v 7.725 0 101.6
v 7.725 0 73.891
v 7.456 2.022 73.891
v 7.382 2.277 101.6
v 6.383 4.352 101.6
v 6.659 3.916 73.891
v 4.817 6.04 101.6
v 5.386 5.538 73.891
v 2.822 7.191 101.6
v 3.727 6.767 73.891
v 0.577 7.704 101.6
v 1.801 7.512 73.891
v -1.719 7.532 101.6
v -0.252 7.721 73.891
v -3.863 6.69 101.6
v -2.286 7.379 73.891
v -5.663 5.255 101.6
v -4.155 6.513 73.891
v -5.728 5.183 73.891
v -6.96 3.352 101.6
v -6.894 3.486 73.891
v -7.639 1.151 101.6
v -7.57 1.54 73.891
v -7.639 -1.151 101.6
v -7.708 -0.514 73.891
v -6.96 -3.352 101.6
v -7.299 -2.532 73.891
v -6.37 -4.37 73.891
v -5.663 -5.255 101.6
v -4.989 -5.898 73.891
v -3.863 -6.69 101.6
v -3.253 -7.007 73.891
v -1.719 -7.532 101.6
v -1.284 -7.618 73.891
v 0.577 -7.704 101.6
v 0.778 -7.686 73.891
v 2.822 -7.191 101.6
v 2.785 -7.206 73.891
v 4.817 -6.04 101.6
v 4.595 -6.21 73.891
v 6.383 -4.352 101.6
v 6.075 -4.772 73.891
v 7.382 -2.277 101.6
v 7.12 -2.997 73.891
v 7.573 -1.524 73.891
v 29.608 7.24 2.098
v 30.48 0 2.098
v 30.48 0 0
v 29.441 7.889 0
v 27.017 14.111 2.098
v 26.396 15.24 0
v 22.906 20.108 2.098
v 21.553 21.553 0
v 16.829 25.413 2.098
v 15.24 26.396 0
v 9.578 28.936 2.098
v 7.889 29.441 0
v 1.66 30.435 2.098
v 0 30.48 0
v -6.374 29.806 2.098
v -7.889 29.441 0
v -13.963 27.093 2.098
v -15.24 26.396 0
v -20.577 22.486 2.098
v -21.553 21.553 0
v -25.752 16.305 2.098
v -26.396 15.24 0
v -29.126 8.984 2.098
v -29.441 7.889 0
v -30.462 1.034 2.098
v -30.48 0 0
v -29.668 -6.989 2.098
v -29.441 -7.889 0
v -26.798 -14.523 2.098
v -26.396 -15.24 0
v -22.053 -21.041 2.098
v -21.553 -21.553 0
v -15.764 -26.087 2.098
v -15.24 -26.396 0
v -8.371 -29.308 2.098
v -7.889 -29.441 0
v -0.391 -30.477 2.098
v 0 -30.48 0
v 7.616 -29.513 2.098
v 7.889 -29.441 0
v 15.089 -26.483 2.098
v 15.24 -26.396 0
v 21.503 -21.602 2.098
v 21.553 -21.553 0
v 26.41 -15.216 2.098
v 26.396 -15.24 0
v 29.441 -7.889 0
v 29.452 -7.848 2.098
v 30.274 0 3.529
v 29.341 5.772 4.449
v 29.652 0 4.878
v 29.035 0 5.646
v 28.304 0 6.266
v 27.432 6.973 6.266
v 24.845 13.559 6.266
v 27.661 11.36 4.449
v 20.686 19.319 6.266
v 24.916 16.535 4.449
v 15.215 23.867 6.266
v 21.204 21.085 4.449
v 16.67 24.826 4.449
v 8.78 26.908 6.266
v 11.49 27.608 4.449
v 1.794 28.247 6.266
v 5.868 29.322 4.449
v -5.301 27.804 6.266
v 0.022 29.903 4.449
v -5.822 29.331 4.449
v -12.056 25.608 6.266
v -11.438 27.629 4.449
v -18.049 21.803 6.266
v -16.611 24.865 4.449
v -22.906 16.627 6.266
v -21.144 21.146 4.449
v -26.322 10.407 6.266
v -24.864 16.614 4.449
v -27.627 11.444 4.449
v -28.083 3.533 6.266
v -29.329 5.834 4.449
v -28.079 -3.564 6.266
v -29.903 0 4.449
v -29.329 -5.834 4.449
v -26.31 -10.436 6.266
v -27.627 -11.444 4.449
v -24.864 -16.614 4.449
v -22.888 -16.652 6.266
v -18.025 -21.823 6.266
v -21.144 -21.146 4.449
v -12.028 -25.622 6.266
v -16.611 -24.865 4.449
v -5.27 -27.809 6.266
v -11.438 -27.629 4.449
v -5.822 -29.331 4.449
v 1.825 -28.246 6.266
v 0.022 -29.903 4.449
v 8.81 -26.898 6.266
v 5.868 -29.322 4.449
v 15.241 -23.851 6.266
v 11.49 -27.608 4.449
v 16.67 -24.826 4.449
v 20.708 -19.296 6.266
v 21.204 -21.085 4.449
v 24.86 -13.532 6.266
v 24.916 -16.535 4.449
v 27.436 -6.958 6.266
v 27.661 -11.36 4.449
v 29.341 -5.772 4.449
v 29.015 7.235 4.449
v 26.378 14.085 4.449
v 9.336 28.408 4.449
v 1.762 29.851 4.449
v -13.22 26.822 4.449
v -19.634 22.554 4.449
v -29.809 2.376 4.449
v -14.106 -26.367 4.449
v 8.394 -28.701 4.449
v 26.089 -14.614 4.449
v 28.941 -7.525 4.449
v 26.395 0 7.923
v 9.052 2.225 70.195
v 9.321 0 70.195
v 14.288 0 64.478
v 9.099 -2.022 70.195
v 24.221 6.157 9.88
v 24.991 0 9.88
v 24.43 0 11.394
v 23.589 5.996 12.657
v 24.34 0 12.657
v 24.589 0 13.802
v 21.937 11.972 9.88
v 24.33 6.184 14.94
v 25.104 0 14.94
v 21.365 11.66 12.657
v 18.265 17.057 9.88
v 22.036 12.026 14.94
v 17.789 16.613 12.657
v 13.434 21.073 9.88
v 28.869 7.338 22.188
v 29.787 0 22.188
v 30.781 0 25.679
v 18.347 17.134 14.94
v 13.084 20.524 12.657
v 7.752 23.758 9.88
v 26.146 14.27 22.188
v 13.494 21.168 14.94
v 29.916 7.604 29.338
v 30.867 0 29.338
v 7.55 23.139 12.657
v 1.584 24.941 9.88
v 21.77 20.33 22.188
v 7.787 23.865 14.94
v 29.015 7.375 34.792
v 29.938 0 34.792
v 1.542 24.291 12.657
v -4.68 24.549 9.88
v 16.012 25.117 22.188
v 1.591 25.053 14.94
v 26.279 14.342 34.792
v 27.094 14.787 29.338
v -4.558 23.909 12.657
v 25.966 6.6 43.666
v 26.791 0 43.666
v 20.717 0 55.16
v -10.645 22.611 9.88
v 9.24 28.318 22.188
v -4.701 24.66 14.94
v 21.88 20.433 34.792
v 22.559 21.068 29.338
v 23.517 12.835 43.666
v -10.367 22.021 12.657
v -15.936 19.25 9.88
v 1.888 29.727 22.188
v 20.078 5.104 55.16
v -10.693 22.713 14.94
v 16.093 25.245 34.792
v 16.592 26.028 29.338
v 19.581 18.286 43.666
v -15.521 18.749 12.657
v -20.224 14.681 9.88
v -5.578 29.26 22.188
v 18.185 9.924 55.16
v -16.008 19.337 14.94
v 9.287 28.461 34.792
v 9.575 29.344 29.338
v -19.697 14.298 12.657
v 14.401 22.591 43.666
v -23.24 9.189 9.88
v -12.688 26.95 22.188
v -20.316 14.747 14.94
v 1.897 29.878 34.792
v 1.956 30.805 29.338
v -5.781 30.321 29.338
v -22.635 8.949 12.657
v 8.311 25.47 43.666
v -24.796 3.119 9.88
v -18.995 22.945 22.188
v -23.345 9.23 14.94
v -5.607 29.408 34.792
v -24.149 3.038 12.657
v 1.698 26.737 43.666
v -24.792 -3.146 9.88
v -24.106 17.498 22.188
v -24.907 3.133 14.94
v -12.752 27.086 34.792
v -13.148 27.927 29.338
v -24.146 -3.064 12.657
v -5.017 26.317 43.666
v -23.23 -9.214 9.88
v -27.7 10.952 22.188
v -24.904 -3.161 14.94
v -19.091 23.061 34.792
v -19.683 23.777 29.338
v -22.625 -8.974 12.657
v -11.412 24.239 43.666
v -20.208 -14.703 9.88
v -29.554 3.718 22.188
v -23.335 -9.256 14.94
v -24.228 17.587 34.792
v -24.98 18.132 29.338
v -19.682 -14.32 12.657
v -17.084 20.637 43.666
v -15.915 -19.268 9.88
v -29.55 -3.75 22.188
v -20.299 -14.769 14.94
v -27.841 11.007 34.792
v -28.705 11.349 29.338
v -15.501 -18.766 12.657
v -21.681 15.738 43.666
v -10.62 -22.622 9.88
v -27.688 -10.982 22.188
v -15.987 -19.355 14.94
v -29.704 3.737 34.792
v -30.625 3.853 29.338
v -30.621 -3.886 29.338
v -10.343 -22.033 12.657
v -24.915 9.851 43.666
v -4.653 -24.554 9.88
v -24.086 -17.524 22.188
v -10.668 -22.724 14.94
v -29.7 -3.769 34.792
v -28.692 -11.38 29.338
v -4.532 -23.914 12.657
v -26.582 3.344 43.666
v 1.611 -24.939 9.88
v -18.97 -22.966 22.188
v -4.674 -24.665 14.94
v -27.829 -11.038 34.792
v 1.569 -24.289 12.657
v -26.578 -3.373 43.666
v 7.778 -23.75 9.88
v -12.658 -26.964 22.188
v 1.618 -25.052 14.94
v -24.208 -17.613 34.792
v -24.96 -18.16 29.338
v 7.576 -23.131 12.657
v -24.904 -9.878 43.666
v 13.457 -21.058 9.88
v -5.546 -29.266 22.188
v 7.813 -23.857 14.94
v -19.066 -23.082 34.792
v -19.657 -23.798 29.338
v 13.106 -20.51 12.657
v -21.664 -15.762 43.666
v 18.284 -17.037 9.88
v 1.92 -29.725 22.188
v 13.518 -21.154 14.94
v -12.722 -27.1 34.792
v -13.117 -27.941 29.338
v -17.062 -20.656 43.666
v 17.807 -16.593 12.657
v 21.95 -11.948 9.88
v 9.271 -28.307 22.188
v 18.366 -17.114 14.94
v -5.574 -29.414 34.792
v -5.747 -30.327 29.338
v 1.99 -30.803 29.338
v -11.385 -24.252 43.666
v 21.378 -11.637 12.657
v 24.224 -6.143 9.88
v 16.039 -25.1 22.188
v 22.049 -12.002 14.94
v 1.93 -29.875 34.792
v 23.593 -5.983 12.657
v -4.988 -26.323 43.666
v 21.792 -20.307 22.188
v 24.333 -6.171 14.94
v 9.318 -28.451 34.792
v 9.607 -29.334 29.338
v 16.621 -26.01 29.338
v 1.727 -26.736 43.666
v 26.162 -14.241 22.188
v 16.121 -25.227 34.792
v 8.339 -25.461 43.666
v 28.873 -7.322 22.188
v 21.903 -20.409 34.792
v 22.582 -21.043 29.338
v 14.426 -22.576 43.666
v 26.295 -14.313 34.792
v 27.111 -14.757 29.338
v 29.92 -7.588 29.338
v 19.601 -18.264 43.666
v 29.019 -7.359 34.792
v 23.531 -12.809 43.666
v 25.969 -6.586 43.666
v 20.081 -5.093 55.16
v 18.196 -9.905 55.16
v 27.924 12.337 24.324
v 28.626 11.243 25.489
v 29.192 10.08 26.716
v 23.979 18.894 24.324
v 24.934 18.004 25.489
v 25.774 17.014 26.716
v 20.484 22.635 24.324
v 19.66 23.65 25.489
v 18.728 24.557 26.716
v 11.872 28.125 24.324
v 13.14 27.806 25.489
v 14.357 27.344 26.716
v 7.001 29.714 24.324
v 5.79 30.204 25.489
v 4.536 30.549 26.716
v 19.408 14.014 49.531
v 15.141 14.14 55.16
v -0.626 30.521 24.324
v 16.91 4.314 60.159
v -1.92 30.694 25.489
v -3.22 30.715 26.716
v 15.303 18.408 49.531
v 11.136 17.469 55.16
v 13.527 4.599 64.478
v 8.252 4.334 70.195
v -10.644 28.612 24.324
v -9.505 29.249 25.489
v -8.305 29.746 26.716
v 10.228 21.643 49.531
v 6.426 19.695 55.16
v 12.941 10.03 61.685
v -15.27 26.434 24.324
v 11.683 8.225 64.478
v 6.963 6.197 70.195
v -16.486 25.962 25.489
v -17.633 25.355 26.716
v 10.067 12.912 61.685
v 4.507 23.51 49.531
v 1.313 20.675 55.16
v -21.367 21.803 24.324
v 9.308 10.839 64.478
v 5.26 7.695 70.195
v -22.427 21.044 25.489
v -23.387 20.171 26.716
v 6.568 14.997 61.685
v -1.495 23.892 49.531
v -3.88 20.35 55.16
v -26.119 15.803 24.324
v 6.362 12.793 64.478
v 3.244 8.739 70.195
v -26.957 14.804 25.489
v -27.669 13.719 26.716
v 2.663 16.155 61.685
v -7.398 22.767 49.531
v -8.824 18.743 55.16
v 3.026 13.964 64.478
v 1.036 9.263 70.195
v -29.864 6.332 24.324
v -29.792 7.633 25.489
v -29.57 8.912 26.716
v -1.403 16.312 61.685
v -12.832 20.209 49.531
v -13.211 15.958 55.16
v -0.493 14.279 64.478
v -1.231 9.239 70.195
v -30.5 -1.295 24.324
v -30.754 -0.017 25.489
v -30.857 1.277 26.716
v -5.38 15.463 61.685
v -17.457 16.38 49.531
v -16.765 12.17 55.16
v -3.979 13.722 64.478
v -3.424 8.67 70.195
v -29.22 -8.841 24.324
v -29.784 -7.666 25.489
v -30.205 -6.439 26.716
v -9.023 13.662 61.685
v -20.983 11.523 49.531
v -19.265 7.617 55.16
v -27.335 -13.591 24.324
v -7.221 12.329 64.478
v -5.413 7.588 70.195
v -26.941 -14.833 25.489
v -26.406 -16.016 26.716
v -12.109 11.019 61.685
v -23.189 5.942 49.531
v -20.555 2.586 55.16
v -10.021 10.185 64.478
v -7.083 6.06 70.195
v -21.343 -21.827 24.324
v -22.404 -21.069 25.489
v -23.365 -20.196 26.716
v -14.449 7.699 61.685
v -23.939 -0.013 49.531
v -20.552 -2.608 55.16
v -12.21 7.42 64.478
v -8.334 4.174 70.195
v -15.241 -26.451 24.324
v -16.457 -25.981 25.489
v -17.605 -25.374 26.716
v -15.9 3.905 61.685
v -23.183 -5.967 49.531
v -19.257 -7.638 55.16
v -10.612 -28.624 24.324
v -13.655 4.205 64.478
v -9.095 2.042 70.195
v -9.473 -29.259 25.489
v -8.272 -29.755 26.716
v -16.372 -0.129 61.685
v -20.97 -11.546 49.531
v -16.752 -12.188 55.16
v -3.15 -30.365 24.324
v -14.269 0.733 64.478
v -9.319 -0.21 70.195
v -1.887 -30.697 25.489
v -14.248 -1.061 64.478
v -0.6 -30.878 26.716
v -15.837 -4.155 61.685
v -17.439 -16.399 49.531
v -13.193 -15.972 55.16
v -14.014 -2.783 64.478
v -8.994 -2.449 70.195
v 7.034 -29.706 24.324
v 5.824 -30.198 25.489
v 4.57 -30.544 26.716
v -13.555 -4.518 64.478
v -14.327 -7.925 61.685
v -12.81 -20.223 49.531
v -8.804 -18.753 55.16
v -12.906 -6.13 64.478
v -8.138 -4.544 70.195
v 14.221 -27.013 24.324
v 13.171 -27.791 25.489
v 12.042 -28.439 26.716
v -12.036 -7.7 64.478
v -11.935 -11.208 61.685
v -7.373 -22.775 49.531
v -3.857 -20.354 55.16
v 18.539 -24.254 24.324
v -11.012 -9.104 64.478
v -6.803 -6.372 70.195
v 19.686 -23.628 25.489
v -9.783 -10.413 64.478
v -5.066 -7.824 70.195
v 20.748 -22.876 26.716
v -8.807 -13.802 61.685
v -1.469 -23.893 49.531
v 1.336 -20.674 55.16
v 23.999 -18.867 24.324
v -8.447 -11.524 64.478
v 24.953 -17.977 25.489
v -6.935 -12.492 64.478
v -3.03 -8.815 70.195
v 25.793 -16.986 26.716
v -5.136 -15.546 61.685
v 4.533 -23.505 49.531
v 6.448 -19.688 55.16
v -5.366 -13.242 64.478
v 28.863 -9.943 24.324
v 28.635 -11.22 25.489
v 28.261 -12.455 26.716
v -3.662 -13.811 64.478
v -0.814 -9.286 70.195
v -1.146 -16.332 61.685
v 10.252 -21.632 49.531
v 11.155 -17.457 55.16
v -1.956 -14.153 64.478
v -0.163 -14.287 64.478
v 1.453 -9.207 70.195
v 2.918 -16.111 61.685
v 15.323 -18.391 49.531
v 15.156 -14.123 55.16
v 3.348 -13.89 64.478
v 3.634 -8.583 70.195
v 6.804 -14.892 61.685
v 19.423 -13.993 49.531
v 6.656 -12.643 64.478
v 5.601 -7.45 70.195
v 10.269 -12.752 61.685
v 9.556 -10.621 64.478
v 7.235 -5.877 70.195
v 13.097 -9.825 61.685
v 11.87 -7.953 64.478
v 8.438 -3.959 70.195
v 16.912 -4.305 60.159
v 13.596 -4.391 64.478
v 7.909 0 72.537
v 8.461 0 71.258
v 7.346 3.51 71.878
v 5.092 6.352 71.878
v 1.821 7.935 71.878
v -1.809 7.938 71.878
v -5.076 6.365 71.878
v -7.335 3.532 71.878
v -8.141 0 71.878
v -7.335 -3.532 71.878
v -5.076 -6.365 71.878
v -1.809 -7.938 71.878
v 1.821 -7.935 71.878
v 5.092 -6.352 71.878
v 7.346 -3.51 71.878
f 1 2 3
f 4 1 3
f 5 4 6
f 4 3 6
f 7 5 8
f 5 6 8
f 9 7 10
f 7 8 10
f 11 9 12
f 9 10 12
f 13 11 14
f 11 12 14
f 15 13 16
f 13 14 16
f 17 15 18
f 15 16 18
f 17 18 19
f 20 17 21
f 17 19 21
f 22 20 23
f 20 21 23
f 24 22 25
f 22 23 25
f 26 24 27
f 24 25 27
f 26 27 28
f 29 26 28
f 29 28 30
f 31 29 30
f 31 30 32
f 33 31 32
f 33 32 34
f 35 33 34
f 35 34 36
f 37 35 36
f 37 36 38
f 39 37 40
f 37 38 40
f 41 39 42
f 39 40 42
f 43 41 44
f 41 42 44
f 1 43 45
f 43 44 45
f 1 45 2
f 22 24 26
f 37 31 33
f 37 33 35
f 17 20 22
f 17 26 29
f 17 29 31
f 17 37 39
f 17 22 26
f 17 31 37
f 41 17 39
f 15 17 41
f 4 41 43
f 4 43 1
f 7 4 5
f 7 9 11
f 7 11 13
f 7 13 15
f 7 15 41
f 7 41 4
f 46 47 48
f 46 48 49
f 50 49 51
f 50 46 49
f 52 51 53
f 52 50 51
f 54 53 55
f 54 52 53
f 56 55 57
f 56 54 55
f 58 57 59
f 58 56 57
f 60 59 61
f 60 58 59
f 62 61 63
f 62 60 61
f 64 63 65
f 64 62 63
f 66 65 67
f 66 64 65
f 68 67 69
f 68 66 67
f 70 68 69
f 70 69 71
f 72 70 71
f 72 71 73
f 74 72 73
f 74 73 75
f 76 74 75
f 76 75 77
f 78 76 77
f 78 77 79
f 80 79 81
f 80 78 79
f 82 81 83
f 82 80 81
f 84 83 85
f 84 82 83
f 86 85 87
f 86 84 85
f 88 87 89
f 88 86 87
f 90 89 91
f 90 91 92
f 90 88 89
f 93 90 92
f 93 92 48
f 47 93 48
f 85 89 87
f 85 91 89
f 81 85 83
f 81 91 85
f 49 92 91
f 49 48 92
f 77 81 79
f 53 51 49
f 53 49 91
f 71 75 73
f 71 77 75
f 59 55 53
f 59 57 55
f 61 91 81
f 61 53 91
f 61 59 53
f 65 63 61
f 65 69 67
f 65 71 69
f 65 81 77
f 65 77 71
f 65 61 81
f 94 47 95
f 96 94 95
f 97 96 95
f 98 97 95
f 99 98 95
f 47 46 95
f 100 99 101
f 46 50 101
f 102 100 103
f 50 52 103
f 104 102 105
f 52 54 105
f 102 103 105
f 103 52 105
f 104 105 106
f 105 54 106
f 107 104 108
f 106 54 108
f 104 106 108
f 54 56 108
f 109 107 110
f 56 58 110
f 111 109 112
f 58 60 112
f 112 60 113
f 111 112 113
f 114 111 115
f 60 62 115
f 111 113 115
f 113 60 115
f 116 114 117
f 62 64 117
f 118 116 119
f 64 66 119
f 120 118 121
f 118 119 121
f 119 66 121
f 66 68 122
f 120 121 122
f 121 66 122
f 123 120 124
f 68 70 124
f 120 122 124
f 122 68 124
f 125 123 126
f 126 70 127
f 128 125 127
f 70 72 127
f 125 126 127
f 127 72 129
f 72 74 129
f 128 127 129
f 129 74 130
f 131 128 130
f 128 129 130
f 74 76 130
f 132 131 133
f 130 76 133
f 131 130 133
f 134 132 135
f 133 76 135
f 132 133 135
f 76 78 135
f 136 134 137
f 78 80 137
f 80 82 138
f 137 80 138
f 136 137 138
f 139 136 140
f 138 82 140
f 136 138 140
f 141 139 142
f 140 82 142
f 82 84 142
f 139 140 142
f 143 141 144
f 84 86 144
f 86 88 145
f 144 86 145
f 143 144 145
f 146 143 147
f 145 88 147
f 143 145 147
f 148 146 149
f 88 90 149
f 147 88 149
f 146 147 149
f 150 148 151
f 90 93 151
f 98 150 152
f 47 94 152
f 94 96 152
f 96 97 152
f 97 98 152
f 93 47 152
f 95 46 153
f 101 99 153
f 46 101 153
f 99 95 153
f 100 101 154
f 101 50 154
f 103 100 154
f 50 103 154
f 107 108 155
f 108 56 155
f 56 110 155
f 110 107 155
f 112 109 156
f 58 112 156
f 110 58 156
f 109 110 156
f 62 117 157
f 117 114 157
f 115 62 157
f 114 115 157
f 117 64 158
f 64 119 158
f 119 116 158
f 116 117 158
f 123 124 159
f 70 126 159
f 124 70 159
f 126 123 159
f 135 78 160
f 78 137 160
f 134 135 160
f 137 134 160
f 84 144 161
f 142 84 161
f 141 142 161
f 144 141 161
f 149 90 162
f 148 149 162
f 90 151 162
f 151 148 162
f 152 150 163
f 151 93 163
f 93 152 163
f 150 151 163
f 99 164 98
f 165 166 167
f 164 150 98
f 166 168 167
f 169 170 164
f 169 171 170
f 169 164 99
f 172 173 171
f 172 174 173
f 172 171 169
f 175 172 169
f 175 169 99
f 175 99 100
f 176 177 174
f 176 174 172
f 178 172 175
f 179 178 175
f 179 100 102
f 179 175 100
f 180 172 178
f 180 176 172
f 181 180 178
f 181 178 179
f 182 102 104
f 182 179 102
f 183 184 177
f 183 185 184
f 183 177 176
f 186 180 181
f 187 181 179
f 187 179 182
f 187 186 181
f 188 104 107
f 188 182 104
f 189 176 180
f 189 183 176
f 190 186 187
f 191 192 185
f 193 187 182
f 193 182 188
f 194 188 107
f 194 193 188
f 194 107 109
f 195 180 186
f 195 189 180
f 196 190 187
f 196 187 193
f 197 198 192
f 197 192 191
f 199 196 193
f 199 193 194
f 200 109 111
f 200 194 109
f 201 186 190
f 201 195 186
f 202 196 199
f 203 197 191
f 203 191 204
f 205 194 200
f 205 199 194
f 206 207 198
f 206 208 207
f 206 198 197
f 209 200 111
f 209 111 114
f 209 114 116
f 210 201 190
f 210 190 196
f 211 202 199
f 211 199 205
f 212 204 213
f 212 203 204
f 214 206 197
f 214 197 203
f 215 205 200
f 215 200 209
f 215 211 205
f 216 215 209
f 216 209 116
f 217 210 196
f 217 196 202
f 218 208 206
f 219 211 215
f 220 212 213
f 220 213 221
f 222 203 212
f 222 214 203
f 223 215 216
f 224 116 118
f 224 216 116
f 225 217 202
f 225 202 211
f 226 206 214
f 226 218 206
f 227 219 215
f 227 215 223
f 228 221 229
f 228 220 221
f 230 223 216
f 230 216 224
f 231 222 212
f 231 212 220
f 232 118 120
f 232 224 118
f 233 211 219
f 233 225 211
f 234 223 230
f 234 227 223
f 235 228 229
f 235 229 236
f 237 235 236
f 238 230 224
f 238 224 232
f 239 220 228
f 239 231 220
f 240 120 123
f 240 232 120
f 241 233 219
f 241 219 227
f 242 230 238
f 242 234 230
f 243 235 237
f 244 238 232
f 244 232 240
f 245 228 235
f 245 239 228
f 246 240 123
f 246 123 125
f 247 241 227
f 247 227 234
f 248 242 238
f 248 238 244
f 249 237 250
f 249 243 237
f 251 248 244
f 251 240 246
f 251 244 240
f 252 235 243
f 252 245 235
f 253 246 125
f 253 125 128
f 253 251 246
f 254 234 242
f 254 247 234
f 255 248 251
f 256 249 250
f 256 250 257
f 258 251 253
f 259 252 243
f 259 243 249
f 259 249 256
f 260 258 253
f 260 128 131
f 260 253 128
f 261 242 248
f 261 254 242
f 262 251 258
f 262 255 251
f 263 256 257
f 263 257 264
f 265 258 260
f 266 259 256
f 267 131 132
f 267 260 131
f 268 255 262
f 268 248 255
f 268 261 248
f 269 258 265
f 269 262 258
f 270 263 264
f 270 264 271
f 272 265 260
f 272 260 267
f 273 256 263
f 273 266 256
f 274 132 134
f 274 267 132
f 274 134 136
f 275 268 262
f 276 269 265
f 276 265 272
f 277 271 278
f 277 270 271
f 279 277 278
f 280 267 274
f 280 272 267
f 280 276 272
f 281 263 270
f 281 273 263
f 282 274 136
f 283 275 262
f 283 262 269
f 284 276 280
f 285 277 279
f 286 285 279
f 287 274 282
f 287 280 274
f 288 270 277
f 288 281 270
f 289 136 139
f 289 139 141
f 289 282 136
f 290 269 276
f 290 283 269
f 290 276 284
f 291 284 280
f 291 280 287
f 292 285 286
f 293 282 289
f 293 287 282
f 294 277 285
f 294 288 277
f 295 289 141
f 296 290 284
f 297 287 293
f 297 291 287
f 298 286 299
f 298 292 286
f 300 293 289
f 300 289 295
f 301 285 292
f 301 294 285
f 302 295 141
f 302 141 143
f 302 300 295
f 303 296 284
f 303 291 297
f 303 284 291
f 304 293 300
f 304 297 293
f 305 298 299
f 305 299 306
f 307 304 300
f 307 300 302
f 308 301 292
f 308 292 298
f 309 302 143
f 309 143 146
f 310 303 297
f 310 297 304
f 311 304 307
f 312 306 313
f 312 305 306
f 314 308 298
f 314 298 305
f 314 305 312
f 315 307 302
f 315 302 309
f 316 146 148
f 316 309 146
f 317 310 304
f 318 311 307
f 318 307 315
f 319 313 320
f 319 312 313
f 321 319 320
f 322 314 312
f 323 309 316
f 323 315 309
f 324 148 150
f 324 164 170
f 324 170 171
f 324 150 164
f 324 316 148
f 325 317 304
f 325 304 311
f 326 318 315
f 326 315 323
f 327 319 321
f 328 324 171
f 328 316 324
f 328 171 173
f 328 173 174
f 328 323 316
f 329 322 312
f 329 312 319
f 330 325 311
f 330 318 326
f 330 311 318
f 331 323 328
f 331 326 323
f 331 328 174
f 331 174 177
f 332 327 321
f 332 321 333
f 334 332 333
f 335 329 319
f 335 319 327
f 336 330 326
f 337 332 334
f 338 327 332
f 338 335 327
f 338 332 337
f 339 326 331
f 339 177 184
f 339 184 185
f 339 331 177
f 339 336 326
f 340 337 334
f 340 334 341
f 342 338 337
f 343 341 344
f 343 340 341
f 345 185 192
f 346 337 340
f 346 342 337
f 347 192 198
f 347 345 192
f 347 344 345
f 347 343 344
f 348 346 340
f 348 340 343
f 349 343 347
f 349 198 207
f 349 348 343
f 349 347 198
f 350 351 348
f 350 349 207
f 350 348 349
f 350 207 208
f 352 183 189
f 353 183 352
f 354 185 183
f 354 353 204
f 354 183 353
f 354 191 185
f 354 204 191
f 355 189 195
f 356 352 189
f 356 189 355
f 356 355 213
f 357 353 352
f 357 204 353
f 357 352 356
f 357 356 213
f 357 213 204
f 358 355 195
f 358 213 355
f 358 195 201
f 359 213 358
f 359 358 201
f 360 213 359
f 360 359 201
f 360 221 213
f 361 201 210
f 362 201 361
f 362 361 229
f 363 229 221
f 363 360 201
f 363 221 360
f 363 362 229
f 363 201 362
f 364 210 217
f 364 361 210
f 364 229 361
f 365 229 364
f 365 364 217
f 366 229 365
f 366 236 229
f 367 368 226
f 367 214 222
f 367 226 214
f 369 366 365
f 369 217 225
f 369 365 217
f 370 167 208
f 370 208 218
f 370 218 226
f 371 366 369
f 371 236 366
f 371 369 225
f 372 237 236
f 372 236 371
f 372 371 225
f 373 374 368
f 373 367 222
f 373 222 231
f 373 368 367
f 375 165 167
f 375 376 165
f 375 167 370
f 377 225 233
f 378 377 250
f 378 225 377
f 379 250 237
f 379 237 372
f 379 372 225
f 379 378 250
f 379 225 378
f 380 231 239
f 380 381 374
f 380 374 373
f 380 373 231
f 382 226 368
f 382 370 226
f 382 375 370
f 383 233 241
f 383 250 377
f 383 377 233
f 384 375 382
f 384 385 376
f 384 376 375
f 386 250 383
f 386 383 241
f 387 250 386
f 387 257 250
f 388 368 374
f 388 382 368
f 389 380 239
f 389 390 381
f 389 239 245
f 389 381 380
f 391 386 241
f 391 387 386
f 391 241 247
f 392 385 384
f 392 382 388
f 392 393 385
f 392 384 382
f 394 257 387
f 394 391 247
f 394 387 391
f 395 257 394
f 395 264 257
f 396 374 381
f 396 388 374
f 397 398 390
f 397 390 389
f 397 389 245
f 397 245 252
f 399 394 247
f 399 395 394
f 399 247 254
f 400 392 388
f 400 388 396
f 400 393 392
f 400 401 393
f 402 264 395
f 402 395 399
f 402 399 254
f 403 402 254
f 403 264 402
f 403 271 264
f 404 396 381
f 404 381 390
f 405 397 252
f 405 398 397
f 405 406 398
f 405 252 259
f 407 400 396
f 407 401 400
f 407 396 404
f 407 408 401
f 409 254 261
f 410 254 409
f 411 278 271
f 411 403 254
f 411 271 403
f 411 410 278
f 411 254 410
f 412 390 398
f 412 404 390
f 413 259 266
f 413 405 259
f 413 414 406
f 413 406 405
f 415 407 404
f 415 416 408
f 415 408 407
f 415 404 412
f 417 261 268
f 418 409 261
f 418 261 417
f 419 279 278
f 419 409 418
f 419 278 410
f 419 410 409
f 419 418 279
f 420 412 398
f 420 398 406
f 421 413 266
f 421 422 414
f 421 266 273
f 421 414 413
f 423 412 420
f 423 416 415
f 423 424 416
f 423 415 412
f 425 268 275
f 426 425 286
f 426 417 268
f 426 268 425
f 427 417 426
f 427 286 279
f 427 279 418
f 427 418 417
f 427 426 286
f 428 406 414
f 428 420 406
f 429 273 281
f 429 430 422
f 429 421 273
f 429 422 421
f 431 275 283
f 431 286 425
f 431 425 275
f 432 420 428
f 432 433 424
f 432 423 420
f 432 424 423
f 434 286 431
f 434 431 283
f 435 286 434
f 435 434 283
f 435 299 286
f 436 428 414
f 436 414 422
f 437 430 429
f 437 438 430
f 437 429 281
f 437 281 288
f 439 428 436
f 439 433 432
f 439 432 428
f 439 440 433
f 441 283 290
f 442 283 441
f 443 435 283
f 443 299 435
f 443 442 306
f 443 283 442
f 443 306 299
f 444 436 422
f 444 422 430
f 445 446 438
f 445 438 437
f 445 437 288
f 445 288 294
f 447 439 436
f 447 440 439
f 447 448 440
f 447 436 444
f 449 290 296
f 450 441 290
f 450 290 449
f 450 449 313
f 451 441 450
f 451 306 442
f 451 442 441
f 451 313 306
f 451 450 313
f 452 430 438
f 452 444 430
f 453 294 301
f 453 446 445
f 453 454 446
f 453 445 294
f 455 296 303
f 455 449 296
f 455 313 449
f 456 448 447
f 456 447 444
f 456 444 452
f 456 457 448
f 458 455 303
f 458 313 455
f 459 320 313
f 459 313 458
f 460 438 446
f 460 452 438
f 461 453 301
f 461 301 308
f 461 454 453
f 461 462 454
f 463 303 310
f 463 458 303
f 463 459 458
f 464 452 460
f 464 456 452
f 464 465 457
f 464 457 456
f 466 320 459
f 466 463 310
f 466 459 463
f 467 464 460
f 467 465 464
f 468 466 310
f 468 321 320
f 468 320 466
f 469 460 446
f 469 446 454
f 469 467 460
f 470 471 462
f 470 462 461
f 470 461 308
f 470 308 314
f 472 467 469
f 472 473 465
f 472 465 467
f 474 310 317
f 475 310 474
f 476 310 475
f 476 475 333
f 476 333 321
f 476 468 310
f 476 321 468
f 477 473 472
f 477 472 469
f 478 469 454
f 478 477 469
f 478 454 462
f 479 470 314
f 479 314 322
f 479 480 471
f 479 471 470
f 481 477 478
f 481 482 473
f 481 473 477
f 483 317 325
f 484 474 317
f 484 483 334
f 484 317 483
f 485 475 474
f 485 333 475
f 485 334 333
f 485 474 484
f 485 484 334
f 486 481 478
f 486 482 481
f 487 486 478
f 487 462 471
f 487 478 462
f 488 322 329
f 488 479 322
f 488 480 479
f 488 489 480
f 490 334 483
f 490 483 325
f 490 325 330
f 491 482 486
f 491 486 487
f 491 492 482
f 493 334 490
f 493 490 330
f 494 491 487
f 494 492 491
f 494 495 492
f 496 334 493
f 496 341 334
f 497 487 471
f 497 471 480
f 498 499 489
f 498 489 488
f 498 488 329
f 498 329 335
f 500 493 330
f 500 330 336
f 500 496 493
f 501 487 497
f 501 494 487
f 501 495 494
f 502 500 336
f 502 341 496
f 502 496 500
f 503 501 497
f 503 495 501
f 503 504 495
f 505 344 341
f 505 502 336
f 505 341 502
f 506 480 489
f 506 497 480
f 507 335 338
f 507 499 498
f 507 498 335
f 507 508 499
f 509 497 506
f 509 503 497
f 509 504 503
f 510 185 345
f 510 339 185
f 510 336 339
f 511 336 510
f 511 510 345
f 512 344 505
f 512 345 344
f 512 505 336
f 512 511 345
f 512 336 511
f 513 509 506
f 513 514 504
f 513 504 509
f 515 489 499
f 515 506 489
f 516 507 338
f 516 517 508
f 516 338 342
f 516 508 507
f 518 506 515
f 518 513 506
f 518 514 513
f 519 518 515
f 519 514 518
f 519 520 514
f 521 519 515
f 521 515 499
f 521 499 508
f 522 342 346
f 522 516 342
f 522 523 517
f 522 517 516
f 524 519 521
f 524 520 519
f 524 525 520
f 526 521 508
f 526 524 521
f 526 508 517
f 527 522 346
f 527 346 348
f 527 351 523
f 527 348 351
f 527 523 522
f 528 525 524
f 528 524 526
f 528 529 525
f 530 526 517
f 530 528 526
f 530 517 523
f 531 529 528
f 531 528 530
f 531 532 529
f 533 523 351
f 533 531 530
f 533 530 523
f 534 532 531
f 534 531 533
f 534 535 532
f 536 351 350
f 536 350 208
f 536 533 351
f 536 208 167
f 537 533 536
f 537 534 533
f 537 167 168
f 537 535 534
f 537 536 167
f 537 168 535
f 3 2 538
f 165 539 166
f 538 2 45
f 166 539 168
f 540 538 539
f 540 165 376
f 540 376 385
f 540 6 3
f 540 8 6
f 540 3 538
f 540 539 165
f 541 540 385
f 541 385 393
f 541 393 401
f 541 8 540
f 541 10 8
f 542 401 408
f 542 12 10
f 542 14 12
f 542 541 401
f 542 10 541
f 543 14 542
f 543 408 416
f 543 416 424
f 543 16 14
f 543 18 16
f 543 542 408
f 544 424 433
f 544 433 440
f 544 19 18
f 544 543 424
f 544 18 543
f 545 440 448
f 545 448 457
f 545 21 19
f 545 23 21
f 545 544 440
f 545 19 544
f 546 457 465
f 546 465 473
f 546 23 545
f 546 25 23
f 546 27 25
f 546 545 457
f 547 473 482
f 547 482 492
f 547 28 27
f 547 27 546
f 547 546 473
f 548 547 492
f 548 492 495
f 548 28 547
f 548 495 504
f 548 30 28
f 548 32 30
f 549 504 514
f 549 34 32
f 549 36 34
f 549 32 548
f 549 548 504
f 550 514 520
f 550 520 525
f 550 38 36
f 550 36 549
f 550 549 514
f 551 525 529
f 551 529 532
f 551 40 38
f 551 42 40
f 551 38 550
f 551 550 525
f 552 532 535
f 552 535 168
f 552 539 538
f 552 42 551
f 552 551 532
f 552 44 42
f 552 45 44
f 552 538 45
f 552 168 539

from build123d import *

# Parameters (mm, degrees)
F2_R     = 5.08
F3_DEPTH = 30.48
F4_R     = 5.08


with BuildPart() as f1:
    # F0 (on Front) → F1 (revolve)
    with BuildSketch(Plane.XZ):
        with BuildLine():
            add(Edge.make_bspline(
                [(8.1309033558, 71.12), (7.9376181833, 71.2042943301), (7.8304224666, 71.1715075808), (7.7253221534, 71.12)],
                knots=[0.9636093673, 0.9636093673, 0.9636093673, 0.9636093673, 1, 1, 1, 1], degree=3))
            Line((7.7253221534, 71.12), (8.1309033558, 71.12))
        make_face()
        with BuildLine():
            Line((0, 71.12), (0, 0))
            Line((0, 0), (30.48, 0))
            Line((30.48, 0), (30.48, 5.08))
            add(Edge.make_bspline(
                [(30.48, 5.08), (27.3303148752, 6.3370296731), (20.5275560182, 13.3757986931), (36.6852035847, 23.8800059507), (21.5393568197, 56.9061702589), (9.4088823722, 70.5626557213), (8.1309033558, 71.12)],
                knots=[0, 0, 0, 0, 0.1775699554, 0.3846763281, 0.7229987487, 0.9636093673, 0.9636093673, 0.9636093673, 0.9636093673], degree=3))
            Line((8.1309033558, 71.12), (7.7253221534, 71.12))
            Line((7.7253221534, 71.12), (0, 71.12))
        make_face()
    revolve(axis=Axis((0, 0, 35.56), (0, 0, 1)))

    # F2
    f2_edges = [f1.edges().sort_by_distance(p)[0] for p in [
        (-30.48, 0, 5.08),
    ]]
    fillet(f2_edges, radius=F2_R)

    # F3 (add): a face of the model
    f3_faces = [f1.faces().sort_by_distance(p)[0] for p in [
        (0, 0, 71.12),
    ]]
    extrude(f3_faces, amount=F3_DEPTH)

    # F4
    f4_edges = [f1.edges().sort_by_distance(p)[0] for p in [
        (-7.725322, 0, 71.12),
    ]]
    fillet(f4_edges, radius=F4_R)


solid = f1.part
